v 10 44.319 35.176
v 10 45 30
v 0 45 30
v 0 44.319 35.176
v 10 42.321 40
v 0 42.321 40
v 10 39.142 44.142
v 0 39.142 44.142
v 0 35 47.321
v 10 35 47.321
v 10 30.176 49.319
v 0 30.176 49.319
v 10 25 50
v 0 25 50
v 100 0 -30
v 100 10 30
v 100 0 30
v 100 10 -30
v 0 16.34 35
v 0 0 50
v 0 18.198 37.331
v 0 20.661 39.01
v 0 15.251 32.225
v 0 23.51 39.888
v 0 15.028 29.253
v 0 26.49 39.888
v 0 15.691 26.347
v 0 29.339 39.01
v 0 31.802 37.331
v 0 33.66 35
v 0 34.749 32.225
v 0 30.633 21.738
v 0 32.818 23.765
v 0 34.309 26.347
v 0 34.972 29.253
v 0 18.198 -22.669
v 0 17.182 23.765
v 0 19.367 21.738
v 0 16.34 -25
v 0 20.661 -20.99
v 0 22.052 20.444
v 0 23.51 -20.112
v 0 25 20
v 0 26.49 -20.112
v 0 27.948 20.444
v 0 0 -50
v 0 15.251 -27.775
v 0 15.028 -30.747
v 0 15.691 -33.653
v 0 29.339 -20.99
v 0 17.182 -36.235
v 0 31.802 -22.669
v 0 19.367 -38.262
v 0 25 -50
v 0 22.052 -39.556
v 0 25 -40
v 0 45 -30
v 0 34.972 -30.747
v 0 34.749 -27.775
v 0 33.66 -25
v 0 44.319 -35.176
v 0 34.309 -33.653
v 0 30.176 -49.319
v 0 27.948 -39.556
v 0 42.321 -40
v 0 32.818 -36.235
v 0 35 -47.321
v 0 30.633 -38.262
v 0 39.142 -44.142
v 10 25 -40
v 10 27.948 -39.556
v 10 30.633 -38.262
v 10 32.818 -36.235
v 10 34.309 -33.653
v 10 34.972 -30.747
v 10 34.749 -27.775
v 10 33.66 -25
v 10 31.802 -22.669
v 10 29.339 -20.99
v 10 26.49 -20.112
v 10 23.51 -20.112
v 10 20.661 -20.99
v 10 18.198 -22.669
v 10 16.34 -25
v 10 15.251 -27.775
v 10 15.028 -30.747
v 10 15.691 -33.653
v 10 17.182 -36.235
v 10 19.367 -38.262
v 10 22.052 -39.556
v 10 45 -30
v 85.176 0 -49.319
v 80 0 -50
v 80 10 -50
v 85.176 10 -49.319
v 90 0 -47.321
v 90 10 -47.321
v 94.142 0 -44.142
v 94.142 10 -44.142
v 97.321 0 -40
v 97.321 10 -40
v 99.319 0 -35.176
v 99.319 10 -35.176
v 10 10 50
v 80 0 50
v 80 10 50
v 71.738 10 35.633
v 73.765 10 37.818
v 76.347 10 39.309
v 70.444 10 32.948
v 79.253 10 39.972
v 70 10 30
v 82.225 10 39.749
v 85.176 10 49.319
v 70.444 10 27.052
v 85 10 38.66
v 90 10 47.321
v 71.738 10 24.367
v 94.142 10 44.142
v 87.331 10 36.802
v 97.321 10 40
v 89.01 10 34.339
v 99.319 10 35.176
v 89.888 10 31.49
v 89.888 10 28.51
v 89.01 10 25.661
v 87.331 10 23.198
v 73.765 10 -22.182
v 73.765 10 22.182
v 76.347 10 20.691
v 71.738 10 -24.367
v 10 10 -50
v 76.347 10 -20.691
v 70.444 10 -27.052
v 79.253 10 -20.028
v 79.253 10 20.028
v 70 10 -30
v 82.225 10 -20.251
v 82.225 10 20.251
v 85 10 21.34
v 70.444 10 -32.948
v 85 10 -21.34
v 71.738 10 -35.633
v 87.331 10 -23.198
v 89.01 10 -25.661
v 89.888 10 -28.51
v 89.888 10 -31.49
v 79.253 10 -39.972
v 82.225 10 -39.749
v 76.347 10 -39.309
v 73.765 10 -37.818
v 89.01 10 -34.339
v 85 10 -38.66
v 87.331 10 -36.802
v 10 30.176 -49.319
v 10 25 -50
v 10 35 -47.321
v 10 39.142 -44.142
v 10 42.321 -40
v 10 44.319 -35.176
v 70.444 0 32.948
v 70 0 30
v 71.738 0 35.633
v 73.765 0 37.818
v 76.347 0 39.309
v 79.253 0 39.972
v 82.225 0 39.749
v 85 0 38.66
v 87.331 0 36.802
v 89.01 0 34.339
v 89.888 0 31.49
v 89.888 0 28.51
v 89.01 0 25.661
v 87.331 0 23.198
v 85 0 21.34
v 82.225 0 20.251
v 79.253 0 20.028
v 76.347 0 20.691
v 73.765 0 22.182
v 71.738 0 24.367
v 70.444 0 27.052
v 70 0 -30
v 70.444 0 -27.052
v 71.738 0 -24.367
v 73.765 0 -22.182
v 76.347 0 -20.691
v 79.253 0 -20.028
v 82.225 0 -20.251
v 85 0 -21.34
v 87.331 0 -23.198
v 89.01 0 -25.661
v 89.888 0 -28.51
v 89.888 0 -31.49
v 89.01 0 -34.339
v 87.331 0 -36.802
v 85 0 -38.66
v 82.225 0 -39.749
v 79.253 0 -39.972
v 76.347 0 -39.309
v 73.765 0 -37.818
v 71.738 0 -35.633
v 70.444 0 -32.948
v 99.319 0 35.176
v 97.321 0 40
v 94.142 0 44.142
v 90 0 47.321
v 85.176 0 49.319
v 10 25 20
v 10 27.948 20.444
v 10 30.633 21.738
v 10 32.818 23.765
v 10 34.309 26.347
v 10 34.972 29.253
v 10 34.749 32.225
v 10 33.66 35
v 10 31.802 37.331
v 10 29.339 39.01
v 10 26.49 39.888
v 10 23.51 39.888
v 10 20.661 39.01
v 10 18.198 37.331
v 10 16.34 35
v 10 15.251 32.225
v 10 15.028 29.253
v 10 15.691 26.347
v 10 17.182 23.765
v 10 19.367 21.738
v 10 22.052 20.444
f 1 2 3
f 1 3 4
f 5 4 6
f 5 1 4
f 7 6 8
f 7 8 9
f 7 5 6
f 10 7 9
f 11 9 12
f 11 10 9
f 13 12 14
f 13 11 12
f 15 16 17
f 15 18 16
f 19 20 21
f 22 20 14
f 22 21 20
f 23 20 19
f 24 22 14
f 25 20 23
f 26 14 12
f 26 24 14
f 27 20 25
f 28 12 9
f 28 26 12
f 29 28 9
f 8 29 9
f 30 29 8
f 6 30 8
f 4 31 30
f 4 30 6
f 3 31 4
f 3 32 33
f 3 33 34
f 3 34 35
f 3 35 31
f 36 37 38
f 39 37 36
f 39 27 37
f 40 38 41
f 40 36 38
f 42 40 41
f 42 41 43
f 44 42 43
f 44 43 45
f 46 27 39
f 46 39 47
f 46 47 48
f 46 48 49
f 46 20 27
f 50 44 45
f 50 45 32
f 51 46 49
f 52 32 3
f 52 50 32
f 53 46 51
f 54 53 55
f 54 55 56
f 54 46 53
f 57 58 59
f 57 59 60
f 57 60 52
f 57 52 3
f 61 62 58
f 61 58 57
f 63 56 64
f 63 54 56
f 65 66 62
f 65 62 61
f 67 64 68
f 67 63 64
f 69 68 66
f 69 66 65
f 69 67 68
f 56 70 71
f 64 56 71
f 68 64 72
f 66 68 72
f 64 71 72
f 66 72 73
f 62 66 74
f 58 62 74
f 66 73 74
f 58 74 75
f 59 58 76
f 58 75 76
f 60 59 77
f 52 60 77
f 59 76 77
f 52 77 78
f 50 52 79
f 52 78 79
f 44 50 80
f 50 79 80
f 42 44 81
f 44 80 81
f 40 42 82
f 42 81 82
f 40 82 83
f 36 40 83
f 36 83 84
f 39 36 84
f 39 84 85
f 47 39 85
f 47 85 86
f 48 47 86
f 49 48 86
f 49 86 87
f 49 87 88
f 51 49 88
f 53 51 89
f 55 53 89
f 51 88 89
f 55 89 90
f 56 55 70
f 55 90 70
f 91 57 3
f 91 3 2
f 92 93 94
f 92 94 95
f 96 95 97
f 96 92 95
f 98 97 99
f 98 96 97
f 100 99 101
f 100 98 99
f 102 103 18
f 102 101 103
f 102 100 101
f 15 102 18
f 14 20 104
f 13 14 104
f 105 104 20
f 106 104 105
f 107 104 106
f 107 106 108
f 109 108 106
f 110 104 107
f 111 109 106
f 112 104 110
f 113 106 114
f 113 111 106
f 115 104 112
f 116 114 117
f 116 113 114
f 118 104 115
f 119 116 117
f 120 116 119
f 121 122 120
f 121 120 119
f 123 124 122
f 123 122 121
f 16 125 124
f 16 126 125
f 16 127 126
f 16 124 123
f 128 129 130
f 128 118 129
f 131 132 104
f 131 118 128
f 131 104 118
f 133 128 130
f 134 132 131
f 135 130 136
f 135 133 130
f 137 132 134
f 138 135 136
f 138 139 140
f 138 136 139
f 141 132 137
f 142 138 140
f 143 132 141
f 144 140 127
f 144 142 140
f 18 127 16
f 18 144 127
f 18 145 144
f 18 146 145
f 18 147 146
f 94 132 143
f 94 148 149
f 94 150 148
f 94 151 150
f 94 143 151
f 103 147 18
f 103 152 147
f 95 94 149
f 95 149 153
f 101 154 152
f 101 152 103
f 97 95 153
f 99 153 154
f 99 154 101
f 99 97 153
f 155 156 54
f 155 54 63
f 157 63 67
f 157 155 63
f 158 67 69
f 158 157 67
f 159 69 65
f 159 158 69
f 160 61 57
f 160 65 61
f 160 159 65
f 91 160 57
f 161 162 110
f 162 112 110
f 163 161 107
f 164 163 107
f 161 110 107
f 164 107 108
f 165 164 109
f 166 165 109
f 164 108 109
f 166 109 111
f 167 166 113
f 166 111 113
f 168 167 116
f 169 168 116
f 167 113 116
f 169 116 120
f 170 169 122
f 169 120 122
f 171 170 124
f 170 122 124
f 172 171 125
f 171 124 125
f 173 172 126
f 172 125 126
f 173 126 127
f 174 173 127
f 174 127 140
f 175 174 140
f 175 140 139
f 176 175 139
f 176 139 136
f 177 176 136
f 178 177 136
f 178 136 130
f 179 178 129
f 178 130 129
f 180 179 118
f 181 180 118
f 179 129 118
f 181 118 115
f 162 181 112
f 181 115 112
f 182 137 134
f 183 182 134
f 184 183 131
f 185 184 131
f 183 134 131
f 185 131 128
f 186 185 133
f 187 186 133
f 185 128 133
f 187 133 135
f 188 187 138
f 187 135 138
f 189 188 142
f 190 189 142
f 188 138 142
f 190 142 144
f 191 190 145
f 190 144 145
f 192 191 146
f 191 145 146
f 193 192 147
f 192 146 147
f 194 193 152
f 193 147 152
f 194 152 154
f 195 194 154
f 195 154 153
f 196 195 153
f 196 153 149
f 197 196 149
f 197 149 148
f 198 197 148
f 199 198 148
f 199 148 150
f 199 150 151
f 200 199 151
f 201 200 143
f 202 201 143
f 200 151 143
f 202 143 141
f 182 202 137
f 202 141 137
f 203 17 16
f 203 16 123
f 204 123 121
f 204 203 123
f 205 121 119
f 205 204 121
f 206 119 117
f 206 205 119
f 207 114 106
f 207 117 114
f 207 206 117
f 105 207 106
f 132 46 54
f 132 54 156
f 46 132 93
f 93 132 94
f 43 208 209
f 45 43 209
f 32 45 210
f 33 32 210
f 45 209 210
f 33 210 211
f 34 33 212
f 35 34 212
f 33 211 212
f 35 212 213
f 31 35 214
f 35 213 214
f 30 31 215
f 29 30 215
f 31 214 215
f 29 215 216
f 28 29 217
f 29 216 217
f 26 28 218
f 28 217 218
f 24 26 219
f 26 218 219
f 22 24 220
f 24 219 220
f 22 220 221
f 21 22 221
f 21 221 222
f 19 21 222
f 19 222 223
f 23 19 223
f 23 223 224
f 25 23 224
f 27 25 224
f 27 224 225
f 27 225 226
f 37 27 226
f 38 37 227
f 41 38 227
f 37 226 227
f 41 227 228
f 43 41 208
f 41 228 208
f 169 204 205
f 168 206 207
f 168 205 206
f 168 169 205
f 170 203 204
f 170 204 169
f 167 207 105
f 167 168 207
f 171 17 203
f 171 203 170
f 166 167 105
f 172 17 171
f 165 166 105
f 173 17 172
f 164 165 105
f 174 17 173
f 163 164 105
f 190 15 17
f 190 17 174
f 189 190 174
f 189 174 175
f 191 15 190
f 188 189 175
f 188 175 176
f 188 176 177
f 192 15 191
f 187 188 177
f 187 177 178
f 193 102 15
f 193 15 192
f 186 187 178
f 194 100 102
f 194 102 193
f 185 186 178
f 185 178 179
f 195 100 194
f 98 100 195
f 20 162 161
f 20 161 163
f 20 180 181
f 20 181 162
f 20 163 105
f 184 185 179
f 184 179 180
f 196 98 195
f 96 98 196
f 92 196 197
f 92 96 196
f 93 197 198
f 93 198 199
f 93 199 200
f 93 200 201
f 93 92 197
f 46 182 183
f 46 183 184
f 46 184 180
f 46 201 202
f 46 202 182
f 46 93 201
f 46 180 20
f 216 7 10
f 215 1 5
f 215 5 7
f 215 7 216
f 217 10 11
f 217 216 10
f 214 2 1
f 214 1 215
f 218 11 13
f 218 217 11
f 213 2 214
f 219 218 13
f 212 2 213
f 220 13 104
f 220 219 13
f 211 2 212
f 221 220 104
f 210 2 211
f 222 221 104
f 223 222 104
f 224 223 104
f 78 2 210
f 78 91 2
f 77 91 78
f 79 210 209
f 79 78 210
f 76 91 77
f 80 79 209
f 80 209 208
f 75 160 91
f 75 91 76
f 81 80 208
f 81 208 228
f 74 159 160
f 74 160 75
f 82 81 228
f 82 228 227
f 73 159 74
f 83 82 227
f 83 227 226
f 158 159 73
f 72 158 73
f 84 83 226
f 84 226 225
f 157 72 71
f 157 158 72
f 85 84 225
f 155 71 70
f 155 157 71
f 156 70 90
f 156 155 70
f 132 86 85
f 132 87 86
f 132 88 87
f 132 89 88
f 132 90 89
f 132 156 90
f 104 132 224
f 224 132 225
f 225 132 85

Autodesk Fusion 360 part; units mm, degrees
sketch "Sketch1" plane through (0, 0, 0) normal (0, 0, 1) x (1, 0, 0)
  line L0 (0, 0) -> (0, 45)
  line L1 (0, 45) -> (10, 45)
  line L2 (10, 45) -> (10, 10)
  line L3 (10, 10) -> (100, 10)
  line L4 (100, 10) -> (100, 0)
  line L5 (100, 0) -> (0, 0)
  dimension "d1" = 10
  dimension "d2" = 100
  dimension "d3" = 45
extrude "Extrude1" add sketch "Sketch1" along normal mid plane 100
fillet "Fillet1" radius 20 4 edges at (5, 45, 50) (5, 45, -50) (100, 5, -50) (100, 5, 50)
sketch "Sketch2" plane through (10, 0, 0) normal (1, 0, 0) x (0, 0, -1)
  arc A0 (50, 25) -> (30, 45) centre (30, 25) ccw
  line L0 (30, 45) -> (-30, 45)
  arc A1 (-30, 45) -> (-50, 25) centre (-30, 25) ccw
  line L1 (-50, 25) -> (-50, 10)
  line L2 (-50, 10) -> (50, 10)
  line L3 (50, 10) -> (50, 25)
  circle A2 centre (-30, 25) radius 10
  circle A3 centre (30, 25) radius 10
  dimension "d7" = 20
extrude "Extrude2" cut sketch "Sketch2" against normal through all contours A2 | A3
sketch "Sketch3" plane through (0, 10, 0) normal (0, 1, 0) x (-1, 0, 0)
  arc A0 (-80, 50) -> (-100, 30) centre (-80, 30) ccw
  line L0 (-100, 30) -> (-100, -30)
  arc A1 (-100, -30) -> (-80, -50) centre (-80, -30) ccw
  line L1 (-80, -50) -> (-10, -50)
  line L2 (-10, -50) -> (-10, 50)
  line L3 (-10, 50) -> (-80, 50)
  circle A2 centre (-80, -30) radius 10
  circle A3 centre (-80, 30) radius 10
  dimension "d9" = 20
extrude "Extrude3" cut sketch "Sketch3" against normal through all contours A2 | A3
